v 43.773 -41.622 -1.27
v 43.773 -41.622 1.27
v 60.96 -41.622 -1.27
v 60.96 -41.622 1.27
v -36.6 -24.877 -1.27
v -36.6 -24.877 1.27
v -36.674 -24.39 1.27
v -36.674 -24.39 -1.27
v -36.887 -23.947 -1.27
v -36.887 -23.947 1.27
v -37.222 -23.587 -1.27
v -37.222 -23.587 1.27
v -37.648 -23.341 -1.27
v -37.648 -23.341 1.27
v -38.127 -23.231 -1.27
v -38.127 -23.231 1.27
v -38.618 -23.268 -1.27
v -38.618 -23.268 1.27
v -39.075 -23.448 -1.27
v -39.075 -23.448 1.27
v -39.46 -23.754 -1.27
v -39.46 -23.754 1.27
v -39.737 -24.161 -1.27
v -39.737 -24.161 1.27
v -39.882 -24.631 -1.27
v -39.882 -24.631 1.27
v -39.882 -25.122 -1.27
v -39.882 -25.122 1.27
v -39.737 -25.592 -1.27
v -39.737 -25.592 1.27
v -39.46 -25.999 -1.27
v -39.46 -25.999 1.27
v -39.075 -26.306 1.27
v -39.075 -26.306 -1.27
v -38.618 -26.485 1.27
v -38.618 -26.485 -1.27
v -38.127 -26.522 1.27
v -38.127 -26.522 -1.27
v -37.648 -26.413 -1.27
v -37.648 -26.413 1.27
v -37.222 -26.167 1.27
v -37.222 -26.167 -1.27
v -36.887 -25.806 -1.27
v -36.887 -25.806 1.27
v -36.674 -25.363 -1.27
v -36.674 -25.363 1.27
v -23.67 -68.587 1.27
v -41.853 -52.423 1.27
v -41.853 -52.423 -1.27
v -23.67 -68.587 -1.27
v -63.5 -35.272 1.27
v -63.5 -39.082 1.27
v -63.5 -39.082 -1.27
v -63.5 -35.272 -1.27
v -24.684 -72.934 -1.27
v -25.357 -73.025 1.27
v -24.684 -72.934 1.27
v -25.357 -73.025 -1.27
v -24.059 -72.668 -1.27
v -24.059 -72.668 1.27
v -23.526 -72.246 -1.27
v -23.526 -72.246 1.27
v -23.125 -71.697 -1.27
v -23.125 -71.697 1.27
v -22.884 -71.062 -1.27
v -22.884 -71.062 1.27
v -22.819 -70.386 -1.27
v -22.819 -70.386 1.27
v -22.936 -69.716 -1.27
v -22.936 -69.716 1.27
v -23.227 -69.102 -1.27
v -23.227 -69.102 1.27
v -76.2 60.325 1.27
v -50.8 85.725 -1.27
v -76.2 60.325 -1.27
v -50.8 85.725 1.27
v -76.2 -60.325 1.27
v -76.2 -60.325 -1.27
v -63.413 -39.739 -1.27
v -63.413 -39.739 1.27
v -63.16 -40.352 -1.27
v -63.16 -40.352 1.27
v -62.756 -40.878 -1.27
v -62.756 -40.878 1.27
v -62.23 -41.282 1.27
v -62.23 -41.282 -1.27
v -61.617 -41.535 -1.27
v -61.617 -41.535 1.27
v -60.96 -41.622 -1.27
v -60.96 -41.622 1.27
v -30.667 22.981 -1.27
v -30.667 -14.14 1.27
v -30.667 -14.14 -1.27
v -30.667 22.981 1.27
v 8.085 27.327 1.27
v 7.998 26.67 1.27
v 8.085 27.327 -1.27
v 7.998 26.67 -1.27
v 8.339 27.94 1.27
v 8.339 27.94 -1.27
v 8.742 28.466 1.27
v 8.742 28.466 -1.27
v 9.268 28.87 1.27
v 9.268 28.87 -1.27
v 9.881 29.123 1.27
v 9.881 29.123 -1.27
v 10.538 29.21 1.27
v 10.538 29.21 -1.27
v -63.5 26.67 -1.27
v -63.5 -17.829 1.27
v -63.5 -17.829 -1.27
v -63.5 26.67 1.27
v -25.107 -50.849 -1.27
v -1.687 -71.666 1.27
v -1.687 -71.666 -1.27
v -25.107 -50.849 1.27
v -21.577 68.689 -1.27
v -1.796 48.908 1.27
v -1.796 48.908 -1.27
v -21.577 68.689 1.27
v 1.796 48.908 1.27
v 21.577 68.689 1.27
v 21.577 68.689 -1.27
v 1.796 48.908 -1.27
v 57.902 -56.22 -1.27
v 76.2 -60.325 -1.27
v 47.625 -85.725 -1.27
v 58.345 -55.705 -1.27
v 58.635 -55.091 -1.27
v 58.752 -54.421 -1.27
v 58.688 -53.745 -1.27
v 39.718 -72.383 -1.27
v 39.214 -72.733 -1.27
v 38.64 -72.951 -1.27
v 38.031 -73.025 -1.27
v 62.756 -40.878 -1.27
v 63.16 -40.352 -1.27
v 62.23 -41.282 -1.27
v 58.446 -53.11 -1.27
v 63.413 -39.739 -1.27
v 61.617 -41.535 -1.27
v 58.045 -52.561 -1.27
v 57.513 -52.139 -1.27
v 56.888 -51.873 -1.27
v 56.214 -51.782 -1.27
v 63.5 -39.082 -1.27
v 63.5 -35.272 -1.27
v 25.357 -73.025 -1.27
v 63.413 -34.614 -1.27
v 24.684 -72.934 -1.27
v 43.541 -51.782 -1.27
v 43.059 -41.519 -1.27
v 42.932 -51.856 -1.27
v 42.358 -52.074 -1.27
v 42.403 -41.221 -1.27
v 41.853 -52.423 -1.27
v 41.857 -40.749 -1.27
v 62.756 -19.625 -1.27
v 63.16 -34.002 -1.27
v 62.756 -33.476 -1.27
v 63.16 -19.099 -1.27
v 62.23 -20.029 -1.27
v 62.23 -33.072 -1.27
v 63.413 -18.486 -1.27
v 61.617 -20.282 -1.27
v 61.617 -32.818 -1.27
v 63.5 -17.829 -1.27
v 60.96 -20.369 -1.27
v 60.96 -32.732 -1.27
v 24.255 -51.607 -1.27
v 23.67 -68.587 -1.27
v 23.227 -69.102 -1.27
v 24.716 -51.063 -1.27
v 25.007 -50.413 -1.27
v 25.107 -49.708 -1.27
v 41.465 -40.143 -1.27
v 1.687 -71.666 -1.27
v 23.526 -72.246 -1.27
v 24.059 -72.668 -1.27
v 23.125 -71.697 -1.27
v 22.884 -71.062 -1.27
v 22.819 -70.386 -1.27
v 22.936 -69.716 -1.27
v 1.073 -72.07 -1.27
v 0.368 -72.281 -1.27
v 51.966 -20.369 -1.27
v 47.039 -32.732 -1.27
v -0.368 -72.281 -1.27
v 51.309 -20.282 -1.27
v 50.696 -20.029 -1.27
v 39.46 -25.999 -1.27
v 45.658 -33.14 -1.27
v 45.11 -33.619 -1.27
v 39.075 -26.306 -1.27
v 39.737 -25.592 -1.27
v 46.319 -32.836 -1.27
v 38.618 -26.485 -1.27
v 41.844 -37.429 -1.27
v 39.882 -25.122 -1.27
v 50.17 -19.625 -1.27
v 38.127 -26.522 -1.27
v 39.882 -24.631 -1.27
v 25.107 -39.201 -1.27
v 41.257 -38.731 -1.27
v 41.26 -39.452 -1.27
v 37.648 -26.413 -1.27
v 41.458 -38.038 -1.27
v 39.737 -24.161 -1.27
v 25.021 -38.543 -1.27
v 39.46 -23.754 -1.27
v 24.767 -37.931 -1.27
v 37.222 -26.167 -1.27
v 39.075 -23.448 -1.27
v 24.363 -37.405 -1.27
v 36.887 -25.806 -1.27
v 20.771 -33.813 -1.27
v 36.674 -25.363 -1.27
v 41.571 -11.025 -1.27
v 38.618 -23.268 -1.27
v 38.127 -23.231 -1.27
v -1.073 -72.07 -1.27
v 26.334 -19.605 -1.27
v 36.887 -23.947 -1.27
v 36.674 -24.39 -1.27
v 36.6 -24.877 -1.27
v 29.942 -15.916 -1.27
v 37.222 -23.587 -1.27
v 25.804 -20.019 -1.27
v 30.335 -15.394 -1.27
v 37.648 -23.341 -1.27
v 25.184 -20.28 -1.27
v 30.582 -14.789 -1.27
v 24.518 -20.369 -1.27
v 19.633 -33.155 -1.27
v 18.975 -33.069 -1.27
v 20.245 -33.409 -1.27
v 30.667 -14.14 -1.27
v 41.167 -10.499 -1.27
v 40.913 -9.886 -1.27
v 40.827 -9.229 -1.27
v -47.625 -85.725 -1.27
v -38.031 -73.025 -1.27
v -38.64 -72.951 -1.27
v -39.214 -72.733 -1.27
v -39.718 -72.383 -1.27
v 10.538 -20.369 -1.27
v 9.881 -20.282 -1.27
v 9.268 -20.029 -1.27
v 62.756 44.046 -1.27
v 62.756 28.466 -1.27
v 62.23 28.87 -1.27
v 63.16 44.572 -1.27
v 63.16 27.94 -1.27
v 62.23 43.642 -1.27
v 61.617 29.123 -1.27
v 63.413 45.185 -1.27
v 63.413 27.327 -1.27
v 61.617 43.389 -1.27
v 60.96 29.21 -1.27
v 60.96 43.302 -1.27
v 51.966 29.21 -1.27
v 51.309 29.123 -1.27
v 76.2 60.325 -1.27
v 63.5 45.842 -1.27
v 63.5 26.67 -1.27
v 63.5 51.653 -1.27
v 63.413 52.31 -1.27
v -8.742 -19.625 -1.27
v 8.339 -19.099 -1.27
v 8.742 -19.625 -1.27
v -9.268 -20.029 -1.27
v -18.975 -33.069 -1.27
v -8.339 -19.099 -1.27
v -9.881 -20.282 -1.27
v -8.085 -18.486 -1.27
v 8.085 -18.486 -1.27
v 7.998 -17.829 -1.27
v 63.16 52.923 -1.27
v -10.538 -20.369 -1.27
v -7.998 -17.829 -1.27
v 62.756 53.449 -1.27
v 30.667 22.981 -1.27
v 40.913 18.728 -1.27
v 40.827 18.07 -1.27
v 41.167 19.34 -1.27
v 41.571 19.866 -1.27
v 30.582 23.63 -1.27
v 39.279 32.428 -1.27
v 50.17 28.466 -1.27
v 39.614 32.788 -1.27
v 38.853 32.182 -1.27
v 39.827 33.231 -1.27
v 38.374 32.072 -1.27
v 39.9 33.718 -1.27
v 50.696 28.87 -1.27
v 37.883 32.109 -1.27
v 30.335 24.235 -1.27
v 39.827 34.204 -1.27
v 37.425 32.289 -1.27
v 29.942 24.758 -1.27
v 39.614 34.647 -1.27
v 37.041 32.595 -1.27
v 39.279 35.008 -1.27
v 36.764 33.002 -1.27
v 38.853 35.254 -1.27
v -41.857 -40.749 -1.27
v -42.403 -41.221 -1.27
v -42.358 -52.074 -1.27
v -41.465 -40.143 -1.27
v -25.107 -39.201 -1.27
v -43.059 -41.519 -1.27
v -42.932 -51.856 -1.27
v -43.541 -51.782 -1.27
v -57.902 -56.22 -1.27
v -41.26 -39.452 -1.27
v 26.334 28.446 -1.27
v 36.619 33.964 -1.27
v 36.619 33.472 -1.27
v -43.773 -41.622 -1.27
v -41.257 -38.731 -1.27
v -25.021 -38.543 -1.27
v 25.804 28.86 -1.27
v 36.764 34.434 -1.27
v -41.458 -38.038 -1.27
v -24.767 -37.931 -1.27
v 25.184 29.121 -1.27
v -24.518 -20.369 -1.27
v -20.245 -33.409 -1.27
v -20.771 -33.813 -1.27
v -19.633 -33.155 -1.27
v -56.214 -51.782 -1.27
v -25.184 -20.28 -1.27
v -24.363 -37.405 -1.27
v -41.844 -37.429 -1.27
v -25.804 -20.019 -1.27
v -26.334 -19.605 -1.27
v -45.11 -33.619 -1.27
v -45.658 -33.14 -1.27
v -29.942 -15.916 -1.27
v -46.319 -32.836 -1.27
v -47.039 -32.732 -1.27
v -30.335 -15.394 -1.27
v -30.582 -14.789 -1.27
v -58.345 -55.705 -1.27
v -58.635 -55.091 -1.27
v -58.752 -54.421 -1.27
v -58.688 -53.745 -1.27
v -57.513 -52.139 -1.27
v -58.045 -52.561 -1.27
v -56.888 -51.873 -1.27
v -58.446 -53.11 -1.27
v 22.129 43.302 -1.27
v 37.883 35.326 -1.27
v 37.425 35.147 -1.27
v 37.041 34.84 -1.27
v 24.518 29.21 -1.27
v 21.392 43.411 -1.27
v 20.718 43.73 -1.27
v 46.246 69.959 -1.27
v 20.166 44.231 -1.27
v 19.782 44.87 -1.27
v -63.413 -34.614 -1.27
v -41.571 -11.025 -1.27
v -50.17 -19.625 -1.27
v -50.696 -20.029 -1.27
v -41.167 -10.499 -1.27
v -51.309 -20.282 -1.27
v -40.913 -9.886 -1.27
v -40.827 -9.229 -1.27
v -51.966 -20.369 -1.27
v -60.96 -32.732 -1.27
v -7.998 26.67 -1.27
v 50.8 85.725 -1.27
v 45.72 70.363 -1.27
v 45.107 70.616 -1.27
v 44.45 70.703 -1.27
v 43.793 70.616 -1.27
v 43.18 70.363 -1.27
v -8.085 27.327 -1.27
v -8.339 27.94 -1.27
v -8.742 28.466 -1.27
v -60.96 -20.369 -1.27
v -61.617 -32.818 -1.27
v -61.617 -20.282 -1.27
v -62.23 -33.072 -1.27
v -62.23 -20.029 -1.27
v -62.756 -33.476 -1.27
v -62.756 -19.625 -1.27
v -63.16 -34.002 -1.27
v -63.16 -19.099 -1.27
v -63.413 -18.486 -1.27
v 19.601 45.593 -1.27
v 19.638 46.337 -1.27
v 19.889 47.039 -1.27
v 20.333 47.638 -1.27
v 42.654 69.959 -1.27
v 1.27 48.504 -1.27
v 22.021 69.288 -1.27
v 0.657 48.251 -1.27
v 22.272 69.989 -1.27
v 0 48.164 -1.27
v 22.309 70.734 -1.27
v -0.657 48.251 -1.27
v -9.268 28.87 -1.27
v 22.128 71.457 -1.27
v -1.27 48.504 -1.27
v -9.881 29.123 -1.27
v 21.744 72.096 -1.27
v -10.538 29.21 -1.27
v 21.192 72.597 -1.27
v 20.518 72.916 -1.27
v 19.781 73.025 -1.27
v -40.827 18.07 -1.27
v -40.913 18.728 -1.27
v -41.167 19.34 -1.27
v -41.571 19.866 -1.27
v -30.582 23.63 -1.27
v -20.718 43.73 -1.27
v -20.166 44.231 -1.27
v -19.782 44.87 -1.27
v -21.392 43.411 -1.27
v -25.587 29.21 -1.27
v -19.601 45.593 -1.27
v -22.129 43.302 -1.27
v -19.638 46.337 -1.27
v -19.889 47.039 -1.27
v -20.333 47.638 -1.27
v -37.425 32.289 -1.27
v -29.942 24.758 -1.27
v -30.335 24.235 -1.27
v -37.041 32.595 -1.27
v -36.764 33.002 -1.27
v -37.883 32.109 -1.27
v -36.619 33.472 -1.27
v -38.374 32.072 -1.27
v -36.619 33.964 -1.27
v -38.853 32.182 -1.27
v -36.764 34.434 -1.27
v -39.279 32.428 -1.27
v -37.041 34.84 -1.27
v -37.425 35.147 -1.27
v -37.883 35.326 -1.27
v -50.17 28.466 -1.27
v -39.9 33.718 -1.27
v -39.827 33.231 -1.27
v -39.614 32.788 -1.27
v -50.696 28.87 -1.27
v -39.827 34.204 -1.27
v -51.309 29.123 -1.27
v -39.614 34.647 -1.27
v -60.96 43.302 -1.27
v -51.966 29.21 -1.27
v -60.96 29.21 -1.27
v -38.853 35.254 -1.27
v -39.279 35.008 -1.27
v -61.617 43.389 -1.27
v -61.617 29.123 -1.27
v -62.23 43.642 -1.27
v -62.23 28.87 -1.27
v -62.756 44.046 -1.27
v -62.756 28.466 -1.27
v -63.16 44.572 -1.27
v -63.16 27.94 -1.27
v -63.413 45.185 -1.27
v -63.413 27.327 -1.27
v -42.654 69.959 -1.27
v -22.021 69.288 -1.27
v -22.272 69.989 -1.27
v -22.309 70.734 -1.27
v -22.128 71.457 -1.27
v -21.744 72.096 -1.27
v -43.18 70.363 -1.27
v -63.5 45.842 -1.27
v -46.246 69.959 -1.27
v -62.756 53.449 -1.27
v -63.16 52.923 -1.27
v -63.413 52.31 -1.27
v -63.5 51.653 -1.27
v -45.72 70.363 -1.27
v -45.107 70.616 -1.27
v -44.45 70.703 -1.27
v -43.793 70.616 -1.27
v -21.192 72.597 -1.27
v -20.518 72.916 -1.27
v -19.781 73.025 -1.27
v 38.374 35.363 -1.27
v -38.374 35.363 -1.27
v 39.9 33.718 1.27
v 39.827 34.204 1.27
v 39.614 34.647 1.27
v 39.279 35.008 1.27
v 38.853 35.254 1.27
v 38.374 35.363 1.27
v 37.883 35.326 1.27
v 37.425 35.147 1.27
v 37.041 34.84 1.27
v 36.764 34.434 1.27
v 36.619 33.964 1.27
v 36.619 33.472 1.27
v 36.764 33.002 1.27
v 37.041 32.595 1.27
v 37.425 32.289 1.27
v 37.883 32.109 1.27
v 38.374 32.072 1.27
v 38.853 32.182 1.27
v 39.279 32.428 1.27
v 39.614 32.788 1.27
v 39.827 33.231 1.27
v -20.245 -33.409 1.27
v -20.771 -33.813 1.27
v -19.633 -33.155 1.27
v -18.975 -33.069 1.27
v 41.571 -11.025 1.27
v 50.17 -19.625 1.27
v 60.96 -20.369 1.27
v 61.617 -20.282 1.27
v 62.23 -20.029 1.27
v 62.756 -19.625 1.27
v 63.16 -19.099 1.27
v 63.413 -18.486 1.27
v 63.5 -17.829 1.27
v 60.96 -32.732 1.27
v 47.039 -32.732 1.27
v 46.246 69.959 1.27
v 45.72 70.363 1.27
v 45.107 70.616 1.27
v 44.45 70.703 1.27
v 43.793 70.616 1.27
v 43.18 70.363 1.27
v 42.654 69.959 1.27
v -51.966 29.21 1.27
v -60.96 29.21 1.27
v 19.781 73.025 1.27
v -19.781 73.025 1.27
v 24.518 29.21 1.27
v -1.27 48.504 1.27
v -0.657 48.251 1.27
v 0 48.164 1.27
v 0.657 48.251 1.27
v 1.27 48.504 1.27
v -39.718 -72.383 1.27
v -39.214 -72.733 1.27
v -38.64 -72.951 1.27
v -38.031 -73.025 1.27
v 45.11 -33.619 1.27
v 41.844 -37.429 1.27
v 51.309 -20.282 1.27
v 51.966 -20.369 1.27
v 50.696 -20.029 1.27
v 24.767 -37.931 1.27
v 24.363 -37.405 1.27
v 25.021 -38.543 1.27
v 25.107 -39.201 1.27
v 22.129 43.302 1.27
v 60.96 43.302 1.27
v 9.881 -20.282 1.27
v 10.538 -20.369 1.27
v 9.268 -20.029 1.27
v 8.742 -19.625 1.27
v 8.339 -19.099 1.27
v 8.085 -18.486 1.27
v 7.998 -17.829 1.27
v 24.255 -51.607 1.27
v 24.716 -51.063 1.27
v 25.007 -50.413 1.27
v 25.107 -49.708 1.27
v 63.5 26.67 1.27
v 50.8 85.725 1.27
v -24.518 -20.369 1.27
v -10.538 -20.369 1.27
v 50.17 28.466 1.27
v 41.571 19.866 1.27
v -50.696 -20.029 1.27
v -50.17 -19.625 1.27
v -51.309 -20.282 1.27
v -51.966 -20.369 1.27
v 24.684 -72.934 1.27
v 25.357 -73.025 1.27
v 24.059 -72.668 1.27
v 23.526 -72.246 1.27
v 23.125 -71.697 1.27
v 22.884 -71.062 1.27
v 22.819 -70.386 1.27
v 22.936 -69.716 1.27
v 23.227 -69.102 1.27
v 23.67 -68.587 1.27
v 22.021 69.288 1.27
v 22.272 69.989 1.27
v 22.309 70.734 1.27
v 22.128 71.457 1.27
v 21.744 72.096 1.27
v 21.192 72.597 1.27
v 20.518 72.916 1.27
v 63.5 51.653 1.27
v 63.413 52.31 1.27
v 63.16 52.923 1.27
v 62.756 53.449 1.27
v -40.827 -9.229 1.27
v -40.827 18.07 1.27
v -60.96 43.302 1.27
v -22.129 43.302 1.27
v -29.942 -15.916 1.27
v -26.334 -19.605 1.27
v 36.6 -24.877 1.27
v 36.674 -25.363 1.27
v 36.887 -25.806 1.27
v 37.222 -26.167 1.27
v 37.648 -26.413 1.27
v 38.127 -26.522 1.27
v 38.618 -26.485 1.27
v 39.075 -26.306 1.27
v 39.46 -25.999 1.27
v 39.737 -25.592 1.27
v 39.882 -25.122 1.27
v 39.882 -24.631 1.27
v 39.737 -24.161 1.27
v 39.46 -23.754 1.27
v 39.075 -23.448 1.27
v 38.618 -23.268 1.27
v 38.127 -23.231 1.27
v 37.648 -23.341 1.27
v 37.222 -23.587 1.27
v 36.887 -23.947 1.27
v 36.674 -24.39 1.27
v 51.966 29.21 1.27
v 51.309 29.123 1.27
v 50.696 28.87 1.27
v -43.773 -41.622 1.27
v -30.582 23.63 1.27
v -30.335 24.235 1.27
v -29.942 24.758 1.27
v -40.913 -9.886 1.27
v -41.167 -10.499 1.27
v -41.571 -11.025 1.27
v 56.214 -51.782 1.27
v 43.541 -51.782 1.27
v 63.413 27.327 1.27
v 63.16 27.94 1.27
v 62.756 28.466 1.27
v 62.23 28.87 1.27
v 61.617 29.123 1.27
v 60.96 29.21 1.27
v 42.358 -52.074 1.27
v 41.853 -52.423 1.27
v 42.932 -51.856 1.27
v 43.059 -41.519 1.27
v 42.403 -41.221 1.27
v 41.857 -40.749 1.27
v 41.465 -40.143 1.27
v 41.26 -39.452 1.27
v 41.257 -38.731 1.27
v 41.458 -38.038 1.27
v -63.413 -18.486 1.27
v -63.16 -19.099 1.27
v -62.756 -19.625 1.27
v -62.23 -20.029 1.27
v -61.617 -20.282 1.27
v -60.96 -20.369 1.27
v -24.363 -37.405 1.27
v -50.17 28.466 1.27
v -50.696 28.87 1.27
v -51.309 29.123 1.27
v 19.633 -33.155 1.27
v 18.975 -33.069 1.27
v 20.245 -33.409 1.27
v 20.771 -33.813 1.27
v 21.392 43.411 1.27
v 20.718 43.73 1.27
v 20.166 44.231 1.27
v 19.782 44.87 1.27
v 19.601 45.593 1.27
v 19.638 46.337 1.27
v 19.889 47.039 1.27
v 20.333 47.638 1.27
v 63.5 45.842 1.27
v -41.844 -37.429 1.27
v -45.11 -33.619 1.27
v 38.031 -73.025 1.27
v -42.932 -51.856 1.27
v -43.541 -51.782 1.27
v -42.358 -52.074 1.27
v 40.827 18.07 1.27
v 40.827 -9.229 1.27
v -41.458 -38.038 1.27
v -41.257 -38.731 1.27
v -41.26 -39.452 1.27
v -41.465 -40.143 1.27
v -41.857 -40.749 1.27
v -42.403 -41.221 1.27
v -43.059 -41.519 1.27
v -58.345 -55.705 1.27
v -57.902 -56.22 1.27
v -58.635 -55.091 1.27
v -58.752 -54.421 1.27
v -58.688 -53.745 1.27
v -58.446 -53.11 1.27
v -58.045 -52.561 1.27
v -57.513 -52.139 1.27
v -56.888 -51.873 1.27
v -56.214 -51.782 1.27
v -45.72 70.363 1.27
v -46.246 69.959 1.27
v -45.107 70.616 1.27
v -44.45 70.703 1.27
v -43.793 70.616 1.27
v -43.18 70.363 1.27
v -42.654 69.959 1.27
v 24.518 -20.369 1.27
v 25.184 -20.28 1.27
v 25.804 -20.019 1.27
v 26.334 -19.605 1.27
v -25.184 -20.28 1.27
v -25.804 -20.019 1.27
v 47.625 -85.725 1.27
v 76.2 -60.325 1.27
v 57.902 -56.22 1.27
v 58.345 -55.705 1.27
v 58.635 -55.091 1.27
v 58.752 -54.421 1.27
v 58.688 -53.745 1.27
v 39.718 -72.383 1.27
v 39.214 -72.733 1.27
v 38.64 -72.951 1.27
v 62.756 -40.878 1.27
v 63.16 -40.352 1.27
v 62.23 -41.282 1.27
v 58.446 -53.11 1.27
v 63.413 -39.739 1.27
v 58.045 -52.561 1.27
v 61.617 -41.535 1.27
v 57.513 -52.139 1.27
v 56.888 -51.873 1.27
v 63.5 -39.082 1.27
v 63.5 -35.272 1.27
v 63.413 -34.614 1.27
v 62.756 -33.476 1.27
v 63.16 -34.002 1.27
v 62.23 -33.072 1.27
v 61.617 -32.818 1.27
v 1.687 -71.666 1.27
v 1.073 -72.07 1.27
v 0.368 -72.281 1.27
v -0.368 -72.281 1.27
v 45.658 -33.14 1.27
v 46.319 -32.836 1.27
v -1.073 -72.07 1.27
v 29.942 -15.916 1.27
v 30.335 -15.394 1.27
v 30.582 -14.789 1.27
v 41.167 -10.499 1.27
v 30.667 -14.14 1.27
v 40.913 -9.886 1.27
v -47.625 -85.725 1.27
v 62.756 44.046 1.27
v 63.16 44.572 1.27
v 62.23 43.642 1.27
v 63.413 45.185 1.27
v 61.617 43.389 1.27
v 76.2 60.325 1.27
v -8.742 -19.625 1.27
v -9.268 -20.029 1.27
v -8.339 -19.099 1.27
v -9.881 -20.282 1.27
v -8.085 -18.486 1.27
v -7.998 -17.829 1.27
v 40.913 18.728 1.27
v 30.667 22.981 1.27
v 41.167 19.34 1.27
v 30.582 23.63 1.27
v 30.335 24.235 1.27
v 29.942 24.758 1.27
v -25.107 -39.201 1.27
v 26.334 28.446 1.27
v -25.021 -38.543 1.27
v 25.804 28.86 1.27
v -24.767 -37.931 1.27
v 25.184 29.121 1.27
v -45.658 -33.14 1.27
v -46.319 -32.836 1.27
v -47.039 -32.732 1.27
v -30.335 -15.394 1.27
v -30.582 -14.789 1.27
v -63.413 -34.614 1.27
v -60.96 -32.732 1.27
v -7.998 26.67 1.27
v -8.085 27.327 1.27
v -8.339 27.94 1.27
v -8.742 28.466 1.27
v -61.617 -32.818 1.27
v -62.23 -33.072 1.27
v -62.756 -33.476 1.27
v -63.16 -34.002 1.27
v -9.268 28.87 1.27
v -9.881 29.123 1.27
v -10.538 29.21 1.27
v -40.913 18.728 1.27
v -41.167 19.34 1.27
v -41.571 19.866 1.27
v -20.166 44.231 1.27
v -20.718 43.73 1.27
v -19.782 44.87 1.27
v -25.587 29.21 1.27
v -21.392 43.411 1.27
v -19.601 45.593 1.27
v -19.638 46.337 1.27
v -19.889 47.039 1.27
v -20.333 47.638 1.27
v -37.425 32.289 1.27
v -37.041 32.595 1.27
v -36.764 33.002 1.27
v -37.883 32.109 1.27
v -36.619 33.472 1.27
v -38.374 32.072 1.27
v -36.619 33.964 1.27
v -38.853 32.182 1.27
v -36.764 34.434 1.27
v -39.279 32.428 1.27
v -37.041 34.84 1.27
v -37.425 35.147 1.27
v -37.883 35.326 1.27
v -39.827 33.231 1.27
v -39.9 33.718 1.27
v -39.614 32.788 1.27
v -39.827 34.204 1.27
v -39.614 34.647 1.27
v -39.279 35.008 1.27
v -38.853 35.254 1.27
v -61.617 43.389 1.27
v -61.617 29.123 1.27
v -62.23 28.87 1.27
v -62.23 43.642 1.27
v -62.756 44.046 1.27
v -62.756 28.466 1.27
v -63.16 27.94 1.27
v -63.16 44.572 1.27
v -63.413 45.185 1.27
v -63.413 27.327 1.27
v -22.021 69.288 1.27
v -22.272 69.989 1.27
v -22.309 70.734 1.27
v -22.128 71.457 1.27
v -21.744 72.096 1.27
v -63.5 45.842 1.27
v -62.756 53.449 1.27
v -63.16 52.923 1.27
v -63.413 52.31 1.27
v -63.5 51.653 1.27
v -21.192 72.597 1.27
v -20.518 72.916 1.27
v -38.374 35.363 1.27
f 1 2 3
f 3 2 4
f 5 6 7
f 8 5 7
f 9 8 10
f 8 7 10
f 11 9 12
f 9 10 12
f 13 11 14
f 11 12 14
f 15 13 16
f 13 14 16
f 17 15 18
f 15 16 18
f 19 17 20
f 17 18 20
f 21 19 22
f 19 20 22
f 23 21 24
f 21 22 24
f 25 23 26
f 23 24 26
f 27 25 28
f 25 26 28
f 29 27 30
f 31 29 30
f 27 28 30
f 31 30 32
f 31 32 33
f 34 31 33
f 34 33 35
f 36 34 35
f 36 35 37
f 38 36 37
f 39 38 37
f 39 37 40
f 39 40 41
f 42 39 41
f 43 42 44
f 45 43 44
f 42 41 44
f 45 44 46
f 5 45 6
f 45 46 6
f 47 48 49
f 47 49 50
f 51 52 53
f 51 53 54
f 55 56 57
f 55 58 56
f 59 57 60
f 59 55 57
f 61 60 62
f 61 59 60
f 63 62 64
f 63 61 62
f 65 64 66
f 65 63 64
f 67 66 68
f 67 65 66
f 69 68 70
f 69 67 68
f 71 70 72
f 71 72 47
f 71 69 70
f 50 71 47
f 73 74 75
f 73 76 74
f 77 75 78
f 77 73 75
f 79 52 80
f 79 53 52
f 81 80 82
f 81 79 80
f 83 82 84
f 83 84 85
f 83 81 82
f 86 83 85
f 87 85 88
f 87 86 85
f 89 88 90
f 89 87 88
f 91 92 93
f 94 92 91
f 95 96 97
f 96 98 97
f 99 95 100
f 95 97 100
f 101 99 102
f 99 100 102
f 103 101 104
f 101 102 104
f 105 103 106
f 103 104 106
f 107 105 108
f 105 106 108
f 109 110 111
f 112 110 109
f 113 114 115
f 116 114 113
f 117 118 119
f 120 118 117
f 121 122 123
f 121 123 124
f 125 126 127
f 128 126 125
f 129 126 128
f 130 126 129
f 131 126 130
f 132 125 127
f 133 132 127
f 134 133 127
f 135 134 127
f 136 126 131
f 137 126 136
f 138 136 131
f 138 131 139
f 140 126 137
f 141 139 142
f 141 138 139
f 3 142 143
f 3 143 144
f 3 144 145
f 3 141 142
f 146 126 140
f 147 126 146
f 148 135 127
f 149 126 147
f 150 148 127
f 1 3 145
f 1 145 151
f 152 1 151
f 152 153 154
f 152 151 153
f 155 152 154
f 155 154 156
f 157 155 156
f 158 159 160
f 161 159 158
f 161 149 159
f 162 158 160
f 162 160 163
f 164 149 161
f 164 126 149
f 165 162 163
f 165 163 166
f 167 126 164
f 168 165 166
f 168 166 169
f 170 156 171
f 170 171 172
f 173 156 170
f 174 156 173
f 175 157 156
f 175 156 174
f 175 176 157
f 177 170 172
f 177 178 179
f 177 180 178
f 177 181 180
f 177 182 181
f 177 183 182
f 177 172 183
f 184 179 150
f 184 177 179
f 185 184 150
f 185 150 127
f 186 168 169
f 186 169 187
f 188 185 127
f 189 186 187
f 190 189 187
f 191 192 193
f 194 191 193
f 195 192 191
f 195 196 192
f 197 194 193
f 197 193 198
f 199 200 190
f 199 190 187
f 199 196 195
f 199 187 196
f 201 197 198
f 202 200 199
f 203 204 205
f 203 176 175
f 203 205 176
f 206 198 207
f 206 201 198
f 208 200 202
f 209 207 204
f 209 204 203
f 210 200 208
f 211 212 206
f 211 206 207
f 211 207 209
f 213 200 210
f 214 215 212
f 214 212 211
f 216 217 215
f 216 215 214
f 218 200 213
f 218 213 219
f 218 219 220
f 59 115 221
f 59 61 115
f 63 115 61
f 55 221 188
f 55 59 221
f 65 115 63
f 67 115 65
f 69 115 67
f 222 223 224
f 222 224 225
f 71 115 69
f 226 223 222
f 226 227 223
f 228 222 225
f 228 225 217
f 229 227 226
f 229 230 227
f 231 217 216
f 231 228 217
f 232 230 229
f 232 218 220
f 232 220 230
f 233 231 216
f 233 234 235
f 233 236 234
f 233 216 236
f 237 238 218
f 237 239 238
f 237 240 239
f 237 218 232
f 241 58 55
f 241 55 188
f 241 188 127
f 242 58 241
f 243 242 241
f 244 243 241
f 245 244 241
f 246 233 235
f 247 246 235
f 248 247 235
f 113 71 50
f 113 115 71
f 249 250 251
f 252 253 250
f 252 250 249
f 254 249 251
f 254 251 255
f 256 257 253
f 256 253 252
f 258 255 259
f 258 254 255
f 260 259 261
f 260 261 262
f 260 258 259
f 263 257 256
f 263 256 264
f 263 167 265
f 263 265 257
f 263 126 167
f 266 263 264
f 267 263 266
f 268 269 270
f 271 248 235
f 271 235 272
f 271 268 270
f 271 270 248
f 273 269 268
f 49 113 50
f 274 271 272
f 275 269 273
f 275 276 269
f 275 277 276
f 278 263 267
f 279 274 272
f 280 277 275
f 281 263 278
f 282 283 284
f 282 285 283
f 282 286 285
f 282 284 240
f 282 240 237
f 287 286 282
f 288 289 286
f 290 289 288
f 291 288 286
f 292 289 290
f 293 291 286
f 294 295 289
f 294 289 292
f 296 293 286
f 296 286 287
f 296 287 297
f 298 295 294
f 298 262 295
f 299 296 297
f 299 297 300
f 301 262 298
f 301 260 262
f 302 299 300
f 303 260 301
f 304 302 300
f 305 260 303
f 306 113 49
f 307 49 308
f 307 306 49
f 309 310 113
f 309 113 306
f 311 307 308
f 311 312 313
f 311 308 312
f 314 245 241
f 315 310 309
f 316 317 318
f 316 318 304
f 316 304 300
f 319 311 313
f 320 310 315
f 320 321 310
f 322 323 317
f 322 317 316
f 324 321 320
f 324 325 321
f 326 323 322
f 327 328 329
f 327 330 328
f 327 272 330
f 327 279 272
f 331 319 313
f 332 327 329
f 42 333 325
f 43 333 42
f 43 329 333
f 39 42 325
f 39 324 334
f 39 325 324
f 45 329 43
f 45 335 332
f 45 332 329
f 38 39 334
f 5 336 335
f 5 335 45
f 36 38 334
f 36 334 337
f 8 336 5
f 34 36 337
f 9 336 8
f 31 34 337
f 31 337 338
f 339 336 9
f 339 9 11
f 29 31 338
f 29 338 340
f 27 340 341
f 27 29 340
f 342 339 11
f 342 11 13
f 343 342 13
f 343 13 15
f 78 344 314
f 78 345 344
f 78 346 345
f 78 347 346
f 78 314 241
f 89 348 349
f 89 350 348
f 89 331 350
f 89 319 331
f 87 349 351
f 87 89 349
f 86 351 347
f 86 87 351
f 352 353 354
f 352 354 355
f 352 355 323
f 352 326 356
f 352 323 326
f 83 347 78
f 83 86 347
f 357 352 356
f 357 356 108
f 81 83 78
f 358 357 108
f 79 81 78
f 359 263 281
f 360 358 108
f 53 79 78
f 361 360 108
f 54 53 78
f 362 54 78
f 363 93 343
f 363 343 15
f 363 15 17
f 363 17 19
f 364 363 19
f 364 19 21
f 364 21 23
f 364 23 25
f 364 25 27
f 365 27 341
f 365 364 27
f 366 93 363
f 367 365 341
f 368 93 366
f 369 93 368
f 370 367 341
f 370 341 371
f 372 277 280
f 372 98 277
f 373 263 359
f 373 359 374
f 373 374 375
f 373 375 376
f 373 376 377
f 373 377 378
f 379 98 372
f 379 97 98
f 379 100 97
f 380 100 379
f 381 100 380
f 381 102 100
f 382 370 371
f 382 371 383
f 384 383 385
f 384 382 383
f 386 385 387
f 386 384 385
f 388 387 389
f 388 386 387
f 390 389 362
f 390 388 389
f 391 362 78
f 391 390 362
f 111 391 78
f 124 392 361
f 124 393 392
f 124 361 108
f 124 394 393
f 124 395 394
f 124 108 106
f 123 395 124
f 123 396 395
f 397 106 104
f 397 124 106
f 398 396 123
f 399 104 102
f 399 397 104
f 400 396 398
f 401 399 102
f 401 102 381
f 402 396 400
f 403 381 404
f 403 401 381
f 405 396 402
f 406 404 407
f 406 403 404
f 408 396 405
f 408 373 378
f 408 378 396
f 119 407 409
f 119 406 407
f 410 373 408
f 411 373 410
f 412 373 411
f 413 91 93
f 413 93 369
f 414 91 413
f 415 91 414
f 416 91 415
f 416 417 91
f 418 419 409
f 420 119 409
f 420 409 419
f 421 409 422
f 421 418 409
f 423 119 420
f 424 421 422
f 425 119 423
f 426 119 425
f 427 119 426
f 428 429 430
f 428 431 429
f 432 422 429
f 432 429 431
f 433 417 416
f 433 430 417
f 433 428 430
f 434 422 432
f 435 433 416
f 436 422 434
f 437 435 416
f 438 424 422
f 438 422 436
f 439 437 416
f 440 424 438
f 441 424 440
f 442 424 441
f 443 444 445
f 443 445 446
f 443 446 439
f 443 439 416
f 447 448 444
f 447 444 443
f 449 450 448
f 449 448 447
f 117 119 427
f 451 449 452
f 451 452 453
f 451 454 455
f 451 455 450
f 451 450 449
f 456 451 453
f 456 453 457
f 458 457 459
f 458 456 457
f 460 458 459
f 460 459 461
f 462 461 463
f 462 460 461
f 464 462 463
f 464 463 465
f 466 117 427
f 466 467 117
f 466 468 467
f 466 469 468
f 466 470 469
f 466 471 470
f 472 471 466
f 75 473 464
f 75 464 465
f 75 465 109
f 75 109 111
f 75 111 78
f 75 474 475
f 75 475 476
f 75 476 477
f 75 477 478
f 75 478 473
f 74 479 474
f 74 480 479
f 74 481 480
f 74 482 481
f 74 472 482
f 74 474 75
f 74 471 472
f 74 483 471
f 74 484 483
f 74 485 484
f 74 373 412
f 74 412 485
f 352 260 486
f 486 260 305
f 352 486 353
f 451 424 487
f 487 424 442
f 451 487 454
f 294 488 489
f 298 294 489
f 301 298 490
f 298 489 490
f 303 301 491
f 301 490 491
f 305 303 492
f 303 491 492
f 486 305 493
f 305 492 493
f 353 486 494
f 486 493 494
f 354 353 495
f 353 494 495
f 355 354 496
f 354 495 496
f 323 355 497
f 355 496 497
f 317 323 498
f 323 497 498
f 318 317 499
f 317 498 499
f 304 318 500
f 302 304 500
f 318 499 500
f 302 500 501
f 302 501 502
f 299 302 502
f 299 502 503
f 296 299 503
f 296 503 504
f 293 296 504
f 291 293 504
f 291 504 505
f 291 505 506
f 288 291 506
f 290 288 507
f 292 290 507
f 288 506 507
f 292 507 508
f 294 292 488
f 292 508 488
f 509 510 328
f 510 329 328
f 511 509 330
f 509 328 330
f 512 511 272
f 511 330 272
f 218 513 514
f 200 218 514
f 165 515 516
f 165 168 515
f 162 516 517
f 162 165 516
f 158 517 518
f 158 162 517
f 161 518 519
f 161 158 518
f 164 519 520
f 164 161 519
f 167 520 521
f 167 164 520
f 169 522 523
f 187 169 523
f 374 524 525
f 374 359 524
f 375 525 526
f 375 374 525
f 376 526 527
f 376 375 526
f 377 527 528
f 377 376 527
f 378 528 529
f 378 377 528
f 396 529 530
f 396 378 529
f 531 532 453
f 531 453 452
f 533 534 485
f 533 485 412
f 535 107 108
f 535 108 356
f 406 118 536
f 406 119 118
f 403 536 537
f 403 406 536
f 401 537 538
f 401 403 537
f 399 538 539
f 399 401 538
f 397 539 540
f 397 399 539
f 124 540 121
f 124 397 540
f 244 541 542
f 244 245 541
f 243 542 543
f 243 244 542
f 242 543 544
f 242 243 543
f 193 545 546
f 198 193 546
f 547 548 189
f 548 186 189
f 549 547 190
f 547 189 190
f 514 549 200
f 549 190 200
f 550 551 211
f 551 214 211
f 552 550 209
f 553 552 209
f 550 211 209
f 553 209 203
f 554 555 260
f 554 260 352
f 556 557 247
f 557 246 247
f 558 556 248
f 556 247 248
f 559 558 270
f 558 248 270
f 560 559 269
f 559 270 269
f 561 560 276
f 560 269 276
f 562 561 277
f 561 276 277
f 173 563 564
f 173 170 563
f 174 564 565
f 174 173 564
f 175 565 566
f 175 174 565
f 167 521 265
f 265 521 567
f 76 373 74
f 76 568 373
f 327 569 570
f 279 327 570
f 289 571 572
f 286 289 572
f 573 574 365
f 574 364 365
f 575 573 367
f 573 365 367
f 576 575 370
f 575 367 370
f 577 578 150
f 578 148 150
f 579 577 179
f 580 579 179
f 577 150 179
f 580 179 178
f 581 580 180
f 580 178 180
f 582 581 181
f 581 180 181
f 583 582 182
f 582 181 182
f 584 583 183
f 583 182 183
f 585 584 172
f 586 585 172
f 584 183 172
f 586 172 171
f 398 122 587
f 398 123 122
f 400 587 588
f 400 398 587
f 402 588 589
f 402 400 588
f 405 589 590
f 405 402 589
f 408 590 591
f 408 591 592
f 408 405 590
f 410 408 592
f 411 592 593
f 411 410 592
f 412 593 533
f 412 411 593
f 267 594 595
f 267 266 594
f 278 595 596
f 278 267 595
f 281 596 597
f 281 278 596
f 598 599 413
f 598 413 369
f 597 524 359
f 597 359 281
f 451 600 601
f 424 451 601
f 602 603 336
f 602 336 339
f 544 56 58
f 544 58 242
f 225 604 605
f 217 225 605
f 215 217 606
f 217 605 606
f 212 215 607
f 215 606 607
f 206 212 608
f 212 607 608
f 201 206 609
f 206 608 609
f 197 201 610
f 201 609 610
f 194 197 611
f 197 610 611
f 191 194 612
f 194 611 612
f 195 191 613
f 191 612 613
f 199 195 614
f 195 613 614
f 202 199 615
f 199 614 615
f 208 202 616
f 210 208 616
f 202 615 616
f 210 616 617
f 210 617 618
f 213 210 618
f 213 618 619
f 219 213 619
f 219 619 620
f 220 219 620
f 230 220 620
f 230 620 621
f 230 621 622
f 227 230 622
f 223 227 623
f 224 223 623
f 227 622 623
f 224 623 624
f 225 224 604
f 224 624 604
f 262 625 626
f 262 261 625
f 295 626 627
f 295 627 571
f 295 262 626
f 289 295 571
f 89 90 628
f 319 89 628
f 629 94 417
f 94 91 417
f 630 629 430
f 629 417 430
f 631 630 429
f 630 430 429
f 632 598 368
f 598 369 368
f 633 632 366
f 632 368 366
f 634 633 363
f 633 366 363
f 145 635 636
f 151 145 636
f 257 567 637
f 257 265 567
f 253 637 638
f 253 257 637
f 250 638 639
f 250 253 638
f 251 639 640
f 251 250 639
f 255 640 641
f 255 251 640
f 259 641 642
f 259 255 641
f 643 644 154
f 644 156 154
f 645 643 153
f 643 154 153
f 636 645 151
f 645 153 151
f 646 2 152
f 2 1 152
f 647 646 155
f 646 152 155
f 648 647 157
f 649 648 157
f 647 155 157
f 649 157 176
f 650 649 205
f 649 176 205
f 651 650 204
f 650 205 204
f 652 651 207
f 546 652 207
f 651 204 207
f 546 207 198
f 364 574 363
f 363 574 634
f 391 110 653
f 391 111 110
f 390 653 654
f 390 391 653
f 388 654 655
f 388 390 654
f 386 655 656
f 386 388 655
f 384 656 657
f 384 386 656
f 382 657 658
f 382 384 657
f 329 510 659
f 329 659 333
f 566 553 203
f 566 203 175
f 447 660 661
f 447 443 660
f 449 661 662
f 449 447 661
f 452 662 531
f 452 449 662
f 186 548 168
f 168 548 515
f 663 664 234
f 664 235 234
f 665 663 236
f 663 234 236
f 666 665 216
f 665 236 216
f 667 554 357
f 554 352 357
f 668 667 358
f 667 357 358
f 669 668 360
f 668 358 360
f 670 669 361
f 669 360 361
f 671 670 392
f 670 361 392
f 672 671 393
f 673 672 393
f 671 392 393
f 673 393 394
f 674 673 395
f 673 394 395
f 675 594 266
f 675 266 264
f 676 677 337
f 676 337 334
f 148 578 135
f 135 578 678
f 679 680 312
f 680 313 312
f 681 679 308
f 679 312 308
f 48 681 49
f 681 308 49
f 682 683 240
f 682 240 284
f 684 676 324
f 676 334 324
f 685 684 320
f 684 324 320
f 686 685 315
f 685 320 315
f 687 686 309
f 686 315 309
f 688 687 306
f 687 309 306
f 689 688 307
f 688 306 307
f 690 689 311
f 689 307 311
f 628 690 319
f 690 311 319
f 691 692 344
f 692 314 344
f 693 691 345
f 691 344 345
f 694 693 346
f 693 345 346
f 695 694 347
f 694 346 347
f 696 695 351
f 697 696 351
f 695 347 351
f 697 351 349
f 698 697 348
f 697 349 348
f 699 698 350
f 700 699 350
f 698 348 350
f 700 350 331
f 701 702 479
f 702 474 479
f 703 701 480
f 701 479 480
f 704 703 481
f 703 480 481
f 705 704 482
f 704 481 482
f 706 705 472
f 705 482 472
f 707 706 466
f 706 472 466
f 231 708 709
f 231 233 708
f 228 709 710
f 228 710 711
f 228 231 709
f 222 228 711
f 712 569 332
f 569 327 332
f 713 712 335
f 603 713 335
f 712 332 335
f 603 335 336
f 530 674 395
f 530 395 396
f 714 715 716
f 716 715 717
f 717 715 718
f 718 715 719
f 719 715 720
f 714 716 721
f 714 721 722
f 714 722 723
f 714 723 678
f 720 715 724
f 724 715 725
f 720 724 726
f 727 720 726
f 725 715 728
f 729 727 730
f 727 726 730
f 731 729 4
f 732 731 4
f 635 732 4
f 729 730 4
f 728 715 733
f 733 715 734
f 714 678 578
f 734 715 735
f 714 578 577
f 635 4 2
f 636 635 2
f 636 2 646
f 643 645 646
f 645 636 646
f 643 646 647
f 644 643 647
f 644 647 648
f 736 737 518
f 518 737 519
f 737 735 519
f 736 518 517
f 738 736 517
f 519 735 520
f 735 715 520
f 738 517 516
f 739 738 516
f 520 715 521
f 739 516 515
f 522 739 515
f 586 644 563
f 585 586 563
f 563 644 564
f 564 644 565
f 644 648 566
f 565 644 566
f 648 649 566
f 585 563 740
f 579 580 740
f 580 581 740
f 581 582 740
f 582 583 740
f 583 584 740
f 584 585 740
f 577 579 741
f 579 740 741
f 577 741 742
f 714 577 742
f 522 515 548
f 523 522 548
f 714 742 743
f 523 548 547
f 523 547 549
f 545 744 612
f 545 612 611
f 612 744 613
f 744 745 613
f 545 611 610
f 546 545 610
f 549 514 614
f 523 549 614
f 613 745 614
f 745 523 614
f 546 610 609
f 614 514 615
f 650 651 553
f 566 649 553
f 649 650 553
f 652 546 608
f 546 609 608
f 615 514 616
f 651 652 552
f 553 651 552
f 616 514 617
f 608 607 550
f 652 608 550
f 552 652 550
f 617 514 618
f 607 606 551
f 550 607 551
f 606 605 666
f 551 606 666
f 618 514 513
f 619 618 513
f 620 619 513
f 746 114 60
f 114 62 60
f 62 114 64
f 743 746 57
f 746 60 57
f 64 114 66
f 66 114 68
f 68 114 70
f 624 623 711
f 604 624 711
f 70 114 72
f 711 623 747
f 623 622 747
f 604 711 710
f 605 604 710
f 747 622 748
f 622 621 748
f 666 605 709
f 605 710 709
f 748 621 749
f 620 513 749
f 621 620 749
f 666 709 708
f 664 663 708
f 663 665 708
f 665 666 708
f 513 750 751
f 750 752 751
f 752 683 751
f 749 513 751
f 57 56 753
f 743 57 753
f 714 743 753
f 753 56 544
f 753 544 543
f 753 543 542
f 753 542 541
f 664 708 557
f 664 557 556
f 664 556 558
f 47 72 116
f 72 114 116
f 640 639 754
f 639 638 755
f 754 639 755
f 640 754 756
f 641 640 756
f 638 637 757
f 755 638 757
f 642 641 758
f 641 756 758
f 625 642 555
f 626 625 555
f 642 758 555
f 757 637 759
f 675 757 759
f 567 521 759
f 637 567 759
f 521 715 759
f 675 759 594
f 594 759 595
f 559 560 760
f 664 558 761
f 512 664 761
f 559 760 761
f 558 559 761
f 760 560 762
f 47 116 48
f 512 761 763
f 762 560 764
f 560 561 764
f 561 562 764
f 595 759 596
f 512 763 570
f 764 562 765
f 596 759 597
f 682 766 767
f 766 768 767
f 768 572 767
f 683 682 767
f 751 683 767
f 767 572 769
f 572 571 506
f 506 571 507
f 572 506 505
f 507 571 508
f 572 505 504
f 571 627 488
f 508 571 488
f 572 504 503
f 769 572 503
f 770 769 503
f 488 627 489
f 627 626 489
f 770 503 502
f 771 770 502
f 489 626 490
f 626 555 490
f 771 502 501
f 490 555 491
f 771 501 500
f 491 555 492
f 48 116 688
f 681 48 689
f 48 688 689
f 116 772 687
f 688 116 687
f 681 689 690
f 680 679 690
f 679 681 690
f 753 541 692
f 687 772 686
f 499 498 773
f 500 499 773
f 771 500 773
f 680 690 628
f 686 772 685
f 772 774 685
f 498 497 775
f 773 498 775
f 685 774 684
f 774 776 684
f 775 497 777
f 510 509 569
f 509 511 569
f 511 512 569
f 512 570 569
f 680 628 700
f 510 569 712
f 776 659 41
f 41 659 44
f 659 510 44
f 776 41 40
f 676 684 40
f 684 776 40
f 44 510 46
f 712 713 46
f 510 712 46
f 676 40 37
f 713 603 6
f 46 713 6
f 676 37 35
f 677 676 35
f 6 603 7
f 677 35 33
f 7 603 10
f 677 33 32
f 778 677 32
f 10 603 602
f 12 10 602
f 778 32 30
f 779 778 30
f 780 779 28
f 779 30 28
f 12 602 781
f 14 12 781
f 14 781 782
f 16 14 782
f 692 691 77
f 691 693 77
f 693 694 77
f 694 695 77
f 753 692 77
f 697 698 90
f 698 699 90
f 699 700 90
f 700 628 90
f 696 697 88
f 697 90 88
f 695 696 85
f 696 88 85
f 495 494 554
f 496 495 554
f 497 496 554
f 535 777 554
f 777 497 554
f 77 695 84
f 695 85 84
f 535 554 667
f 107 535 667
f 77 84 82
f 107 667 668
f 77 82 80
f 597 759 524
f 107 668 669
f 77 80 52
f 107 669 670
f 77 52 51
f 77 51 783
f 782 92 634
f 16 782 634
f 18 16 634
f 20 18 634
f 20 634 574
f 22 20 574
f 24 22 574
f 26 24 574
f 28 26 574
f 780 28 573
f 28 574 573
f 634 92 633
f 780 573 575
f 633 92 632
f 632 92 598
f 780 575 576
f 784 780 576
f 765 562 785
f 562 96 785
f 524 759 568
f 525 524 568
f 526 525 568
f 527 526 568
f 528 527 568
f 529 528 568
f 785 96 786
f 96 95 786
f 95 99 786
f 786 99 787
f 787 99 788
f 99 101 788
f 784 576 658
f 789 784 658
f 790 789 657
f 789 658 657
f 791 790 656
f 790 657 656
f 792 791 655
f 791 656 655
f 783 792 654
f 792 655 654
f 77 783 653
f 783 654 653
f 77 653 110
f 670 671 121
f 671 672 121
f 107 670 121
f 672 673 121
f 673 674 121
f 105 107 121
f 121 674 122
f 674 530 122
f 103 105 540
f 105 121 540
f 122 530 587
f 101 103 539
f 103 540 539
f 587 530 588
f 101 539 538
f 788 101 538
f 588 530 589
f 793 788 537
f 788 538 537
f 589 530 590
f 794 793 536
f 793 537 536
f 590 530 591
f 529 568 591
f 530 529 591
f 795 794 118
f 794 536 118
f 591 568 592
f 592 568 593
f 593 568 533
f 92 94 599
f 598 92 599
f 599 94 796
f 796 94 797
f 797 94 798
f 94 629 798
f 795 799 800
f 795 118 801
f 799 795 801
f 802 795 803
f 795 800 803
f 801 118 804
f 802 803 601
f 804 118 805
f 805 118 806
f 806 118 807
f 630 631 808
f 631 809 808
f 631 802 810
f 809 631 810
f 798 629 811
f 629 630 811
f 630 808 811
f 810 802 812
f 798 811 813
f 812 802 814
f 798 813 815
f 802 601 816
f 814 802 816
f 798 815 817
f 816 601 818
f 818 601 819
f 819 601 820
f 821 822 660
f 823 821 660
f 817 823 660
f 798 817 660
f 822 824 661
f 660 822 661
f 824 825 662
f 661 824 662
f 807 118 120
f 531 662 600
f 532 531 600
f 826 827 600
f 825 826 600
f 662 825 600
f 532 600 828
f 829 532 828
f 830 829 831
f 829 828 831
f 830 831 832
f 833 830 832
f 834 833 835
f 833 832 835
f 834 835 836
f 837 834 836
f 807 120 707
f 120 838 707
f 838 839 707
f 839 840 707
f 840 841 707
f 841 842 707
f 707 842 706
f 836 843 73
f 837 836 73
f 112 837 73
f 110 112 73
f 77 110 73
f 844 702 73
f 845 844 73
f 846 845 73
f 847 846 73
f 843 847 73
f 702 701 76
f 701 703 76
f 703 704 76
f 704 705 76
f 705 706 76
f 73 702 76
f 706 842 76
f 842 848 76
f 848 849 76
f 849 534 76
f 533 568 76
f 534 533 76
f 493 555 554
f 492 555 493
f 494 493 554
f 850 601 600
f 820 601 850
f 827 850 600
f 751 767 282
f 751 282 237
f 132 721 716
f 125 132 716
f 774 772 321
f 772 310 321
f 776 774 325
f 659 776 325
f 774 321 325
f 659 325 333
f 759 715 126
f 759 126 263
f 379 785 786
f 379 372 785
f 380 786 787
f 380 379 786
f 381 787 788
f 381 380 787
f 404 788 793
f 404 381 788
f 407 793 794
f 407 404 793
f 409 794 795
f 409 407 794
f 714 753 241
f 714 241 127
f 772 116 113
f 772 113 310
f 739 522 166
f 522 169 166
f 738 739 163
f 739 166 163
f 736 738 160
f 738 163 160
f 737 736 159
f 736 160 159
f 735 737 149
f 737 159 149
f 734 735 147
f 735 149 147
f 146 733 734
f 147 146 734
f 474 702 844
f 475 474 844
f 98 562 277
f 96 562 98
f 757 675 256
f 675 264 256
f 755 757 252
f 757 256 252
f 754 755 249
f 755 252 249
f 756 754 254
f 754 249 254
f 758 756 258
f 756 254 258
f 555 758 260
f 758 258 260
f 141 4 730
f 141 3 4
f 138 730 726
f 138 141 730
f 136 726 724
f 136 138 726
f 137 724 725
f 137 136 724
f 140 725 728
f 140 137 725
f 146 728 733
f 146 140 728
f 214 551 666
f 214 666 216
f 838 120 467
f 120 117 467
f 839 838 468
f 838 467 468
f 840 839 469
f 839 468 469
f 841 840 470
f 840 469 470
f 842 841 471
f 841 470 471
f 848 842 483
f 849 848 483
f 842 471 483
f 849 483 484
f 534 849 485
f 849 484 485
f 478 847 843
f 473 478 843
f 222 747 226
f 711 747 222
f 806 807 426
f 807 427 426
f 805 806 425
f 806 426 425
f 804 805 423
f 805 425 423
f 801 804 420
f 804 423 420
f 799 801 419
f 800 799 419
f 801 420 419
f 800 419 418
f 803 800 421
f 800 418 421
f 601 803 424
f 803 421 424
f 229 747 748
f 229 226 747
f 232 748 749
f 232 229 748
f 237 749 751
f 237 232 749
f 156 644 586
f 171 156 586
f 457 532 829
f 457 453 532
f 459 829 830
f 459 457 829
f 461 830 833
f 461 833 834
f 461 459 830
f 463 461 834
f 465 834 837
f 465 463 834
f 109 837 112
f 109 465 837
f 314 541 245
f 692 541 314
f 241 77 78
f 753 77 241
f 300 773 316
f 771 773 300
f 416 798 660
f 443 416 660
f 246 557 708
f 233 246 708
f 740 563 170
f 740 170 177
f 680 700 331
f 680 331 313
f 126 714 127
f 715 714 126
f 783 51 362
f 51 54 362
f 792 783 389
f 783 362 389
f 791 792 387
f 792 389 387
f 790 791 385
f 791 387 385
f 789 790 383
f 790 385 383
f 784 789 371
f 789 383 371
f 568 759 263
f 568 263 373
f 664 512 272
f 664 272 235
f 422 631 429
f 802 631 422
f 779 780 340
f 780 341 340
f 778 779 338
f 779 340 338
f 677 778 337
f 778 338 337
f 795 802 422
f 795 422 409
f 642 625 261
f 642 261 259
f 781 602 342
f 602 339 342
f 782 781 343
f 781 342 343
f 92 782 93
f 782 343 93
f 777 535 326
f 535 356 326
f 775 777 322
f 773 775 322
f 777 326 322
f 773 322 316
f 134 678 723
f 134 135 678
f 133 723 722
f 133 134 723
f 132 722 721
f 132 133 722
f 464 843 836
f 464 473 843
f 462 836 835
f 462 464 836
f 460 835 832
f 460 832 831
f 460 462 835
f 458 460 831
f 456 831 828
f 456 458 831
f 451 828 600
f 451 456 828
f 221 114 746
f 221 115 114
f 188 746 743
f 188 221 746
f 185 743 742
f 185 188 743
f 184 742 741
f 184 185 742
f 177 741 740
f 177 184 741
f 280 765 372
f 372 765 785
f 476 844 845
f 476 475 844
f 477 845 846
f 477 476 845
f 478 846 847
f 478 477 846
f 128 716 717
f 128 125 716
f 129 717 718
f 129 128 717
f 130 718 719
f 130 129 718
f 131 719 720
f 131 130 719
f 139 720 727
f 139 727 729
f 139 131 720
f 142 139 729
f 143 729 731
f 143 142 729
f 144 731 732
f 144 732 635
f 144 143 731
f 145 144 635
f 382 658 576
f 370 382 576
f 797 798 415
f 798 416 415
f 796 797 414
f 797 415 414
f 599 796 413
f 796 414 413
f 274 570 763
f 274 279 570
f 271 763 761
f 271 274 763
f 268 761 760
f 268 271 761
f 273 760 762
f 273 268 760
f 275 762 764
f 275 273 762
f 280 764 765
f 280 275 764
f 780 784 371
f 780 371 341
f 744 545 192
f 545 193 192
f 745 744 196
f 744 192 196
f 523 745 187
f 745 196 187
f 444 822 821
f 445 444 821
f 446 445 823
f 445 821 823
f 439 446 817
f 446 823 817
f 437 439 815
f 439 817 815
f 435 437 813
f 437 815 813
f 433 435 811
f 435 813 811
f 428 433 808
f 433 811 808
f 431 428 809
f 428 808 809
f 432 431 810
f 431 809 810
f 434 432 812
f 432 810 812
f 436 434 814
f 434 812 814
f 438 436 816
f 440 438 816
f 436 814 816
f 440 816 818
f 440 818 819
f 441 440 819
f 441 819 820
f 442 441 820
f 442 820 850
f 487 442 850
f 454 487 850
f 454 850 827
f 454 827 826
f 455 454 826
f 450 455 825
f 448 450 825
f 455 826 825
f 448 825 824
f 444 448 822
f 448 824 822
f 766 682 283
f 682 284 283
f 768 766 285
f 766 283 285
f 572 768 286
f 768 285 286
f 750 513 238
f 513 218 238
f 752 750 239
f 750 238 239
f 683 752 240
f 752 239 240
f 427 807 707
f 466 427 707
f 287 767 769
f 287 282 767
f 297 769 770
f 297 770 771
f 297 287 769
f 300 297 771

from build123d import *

# Parameters (mm, degrees)
BOSS_EXTRUDE1_DEPTH = 1.27
BOSS_EXTRUDE2_DEPTH = 2.54
SKETCH3_W           = 55.501519427
SKETCH3_H           = 49.578797493
CUT_EXTRUDE1_DEPTH  = 2.54
BOSS_EXTRUDE3_DEPTH = 2.54
BOSS_EXTRUDE4_DEPTH = 2.54
SKETCH6_R           = 1.65
CUT_EXTRUDE2_DEPTH  = 2.54
CHAMFER1_SIZE       = 5.08
FILLET1_R           = 2.54
FILLET2_R           = 2.54


with BuildPart() as part:
    # Sketch1 → Boss-Extrude1 (new, symmetric)
    with BuildSketch(Plane.XY):
        Polygon((-76.2, 60.325), (-76.2, -60.325), (76.2, -60.325), (76.2, 60.325), (50.8, 85.725), (-50.8, 85.725), align=None)
    extrude(amount=BOSS_EXTRUDE1_DEPTH, both=True)

    # Sketch2 → Boss-Extrude2 (add)
    with BuildSketch(Plane.XY.offset(1.27)):
        Polygon((-47.625, -85.725), (47.625, -85.725), (76.2, -60.325), (-76.2, -60.325), align=None)
    extrude(amount=-BOSS_EXTRUDE2_DEPTH)

    # Sketch3 → Cut-Extrude1 (cut)
    with BuildSketch(Plane.XY.offset(1.27)):
        Polygon((-25.107219952, -50.848797493), (-25.107219952, -33.068797493), (25.107219952, -33.068797493), (25.107219952, -50.848797493), (0, -73.166326339), align=None)
        Polygon((-62.895047936, -51.78188729), (-42.575047936, -51.78188729), (-18.676546137, -73.025), (-38.996546137, -73.025), align=None)
        Polygon((-25.913038854, 73.025), (25.913038854, 73.025), (0, 47.111961146), align=None)
        Polygon((18.676546137, -73.025), (38.996546137, -73.025), (62.895047936, -51.78188729), (42.575047936, -51.78188729), align=None)
        Polygon((-44.45, 71.755), (-63.5, 52.705), (-63.5, 43.301961146), (-15.996961146, 43.301961146), align=None)
        Polygon((44.45, 71.755), (63.5, 52.705), (63.5, 43.301961146), (15.996961146, 43.301961146), align=None)
        with Locations((-35.749240287, 4.420601253)):
            Rectangle(SKETCH3_W, SKETCH3_H)
        with Locations((35.749240287, 4.420601253)):
            Rectangle(SKETCH3_W, SKETCH3_H)
    extrude(amount=-CUT_EXTRUDE1_DEPTH, mode=Mode.SUBTRACT)

    # Sketch4 → Boss-Extrude3 (add)
    with BuildSketch(Plane.XY.offset(1.27)):
        Polygon((40.826553226, 29.21), (30.666553226, 29.21), (30.666553226, 24.01714149), (30.666553226, -15.175938983), (30.666553226, -20.368797493), (40.826553226, -20.368797493), (40.826553226, -12.82106127), (40.826553226, 21.662263777), align=None)
        Polygon((30.666553226, 24.01714149), (30.666553226, 29.21), (25.586553226, 29.21), align=None)
        Polygon((48.374289449, 29.21), (40.826553226, 29.21), (40.826553226, 21.662263777), align=None)
        Polygon((30.666553226, -20.368797493), (30.666553226, -15.175938983), (25.586553226, -20.368797493), align=None)
        Polygon((48.374289449, -20.368797493), (40.826553226, -12.82106127), (40.826553226, -20.368797493), align=None)
        Polygon((-25.586553226, 29.21), (-30.666553226, 29.21), (-30.666553226, 24.01714149), align=None)
        Polygon((-30.666553226, 24.01714149), (-30.666553226, 29.21), (-40.826553226, 29.21), (-40.826553226, 21.662263777), (-40.826553226, -12.82106127), (-40.826553226, -20.368797493), (-30.666553226, -20.368797493), (-30.666553226, -15.175938983), align=None)
        Polygon((-40.826553226, 21.662263777), (-40.826553226, 29.21), (-48.374289449, 29.21), align=None)
        Polygon((-25.586553226, -20.368797493), (-30.666553226, -15.175938983), (-30.666553226, -20.368797493), align=None)
        Polygon((-40.826553226, -20.368797493), (-40.826553226, -12.82106127), (-48.374289449, -20.368797493), align=None)
    extrude(amount=-BOSS_EXTRUDE3_DEPTH)

    # Sketch5 → Boss-Extrude4 (add)
    with BuildSketch(Plane.XY.offset(1.27)):
        Polygon((-40.826553226, 21.662263777), (-40.826553226, 19.122263777), (-50.914289449, 29.21), (-48.374289449, 29.21), align=None)
        Polygon((-48.374289449, -20.368797493), (-50.914289449, -20.368797493), (-40.826553226, -10.28106127), (-40.826553226, -12.82106127), align=None)
        Polygon((48.374289449, -20.368797493), (40.826553226, -12.82106127), (40.826553226, -10.28106127), (50.914289449, -20.368797493), align=None)
        Polygon((48.374289449, 29.21), (50.914289449, 29.21), (40.826553226, 19.122263777), (40.826553226, 21.662263777), align=None)
    extrude(amount=-BOSS_EXTRUDE4_DEPTH)

    # Sketch6 → Cut-Extrude2 (cut)
    with BuildSketch(Plane.XY.offset(1.27)):
        with Locations((38.250421337, 33.717772659)):
            Circle(SKETCH6_R)
        with Locations(Location((38.250421337, -24.876570152, 0), (0, 0, 180))):
            Circle(SKETCH6_R)
        with Locations((-38.250421337, -24.876570152)):
            Circle(SKETCH6_R)
        with Locations(Location((-38.250421337, 33.717772659, 0), (0, 0, 180))):
            Circle(SKETCH6_R)
        Polygon((45.870421337, -41.62188729), (63.5, -41.62188729), (63.5, -32.73188729), (45.870421337, -32.73188729), (38.250421337, -41.62188729), align=None)
        Polygon((-63.5, -41.62188729), (-63.5, -32.73188729), (-45.870421337, -32.73188729), (-38.250421337, -41.62188729), (-45.870421337, -41.62188729), align=None)
    extrude(amount=-CUT_EXTRUDE2_DEPTH, mode=Mode.SUBTRACT)

    # Chamfer1
    chamfer1_edges = [part.edges().sort_by_distance(p)[0] for p in [
        (-25.107219952, -33.068797493, 0),
        (25.107219952, -33.068797493, 0),
    ]]
    chamfer(chamfer1_edges, length=CHAMFER1_SIZE)

    # Fillet1
    fillet1_edges = [part.edges().sort_by_distance(p)[0] for p in [
        (25.107219952, -50.848797493, 0),
        (0, -73.166326339, 0),
        (38.250421337, -41.62188729, 0),
        (45.870421337, -32.73188729, 0),
        (63.5, -32.73188729, 0),
        (63.5, -41.62188729, 0),
        (-63.5, -41.62188729, 0),
        (-63.5, -32.73188729, 0),
        (-45.870421337, -32.73188729, 0),
        (-38.250421337, -41.62188729, 0),
        (-20.027219952, -33.068797493, 0),
        (20.027219952, -33.068797493, 0),
        (25.107219952, -38.148797493, 0),
        (-25.107219952, -38.148797493, 0),
        (-38.996546137, -73.025, 0),
        (-62.895047936, -51.78188729, 0),
        (-42.575047936, -51.78188729, 0),
        (-18.676546137, -73.025, 0),
        (18.676546137, -73.025, 0),
        (42.575047936, -51.78188729, 0),
        (62.895047936, -51.78188729, 0),
        (38.996546137, -73.025, 0),
    ]]
    fillet(fillet1_edges, radius=FILLET1_R)

    # Fillet2
    fillet2_edges = [part.edges().sort_by_distance(p)[0] for p in [
        (-44.45, 71.755, 0),
        (-15.996961146, 43.301961146, 0),
        (-63.5, 43.301961146, 0),
        (-63.5, 52.705, 0),
        (15.996961146, 43.301961146, 0),
        (44.45, 71.755, 0),
        (63.5, 52.705, 0),
        (63.5, 43.301961146, 0),
        (7.998480573, 29.21, 0),
        (63.5, 29.21, 0),
        (63.5, -20.368797493, 0),
        (7.998480573, -20.368797493, 0),
        (25.586553226, 29.21, 0),
        (30.666553226, -15.175938983, 0),
        (30.666553226, 24.01714149, 0),
        (25.586553226, -20.368797493, 0),
        (-25.586553226, -20.368797493, 0),
        (-30.666553226, -15.175938983, 0),
        (-30.666553226, 24.01714149, 0),
        (-50.914289449, -20.368797493, 0),
        (-40.826553226, -10.28106127, 0),
        (50.914289449, 29.21, 0),
        (40.826553226, 19.122263777, 0),
        (50.914289449, -20.368797493, 0),
        (40.826553226, -10.28106127, 0),
        (-50.914289449, 29.21, 0),
        (-40.826553226, 19.122263777, 0),
        (-7.998480573, -20.368797493, 0),
        (-63.5, -20.368797493, 0),
        (-63.5, 29.21, 0),
        (-7.998480573, 29.21, 0),
        (25.913038854, 73.025, 0),
        (0, 47.111961146, 0),
        (-25.913038854, 73.025, 0),
    ]]
    fillet(fillet2_edges, radius=FILLET2_R)


solid = part.part
